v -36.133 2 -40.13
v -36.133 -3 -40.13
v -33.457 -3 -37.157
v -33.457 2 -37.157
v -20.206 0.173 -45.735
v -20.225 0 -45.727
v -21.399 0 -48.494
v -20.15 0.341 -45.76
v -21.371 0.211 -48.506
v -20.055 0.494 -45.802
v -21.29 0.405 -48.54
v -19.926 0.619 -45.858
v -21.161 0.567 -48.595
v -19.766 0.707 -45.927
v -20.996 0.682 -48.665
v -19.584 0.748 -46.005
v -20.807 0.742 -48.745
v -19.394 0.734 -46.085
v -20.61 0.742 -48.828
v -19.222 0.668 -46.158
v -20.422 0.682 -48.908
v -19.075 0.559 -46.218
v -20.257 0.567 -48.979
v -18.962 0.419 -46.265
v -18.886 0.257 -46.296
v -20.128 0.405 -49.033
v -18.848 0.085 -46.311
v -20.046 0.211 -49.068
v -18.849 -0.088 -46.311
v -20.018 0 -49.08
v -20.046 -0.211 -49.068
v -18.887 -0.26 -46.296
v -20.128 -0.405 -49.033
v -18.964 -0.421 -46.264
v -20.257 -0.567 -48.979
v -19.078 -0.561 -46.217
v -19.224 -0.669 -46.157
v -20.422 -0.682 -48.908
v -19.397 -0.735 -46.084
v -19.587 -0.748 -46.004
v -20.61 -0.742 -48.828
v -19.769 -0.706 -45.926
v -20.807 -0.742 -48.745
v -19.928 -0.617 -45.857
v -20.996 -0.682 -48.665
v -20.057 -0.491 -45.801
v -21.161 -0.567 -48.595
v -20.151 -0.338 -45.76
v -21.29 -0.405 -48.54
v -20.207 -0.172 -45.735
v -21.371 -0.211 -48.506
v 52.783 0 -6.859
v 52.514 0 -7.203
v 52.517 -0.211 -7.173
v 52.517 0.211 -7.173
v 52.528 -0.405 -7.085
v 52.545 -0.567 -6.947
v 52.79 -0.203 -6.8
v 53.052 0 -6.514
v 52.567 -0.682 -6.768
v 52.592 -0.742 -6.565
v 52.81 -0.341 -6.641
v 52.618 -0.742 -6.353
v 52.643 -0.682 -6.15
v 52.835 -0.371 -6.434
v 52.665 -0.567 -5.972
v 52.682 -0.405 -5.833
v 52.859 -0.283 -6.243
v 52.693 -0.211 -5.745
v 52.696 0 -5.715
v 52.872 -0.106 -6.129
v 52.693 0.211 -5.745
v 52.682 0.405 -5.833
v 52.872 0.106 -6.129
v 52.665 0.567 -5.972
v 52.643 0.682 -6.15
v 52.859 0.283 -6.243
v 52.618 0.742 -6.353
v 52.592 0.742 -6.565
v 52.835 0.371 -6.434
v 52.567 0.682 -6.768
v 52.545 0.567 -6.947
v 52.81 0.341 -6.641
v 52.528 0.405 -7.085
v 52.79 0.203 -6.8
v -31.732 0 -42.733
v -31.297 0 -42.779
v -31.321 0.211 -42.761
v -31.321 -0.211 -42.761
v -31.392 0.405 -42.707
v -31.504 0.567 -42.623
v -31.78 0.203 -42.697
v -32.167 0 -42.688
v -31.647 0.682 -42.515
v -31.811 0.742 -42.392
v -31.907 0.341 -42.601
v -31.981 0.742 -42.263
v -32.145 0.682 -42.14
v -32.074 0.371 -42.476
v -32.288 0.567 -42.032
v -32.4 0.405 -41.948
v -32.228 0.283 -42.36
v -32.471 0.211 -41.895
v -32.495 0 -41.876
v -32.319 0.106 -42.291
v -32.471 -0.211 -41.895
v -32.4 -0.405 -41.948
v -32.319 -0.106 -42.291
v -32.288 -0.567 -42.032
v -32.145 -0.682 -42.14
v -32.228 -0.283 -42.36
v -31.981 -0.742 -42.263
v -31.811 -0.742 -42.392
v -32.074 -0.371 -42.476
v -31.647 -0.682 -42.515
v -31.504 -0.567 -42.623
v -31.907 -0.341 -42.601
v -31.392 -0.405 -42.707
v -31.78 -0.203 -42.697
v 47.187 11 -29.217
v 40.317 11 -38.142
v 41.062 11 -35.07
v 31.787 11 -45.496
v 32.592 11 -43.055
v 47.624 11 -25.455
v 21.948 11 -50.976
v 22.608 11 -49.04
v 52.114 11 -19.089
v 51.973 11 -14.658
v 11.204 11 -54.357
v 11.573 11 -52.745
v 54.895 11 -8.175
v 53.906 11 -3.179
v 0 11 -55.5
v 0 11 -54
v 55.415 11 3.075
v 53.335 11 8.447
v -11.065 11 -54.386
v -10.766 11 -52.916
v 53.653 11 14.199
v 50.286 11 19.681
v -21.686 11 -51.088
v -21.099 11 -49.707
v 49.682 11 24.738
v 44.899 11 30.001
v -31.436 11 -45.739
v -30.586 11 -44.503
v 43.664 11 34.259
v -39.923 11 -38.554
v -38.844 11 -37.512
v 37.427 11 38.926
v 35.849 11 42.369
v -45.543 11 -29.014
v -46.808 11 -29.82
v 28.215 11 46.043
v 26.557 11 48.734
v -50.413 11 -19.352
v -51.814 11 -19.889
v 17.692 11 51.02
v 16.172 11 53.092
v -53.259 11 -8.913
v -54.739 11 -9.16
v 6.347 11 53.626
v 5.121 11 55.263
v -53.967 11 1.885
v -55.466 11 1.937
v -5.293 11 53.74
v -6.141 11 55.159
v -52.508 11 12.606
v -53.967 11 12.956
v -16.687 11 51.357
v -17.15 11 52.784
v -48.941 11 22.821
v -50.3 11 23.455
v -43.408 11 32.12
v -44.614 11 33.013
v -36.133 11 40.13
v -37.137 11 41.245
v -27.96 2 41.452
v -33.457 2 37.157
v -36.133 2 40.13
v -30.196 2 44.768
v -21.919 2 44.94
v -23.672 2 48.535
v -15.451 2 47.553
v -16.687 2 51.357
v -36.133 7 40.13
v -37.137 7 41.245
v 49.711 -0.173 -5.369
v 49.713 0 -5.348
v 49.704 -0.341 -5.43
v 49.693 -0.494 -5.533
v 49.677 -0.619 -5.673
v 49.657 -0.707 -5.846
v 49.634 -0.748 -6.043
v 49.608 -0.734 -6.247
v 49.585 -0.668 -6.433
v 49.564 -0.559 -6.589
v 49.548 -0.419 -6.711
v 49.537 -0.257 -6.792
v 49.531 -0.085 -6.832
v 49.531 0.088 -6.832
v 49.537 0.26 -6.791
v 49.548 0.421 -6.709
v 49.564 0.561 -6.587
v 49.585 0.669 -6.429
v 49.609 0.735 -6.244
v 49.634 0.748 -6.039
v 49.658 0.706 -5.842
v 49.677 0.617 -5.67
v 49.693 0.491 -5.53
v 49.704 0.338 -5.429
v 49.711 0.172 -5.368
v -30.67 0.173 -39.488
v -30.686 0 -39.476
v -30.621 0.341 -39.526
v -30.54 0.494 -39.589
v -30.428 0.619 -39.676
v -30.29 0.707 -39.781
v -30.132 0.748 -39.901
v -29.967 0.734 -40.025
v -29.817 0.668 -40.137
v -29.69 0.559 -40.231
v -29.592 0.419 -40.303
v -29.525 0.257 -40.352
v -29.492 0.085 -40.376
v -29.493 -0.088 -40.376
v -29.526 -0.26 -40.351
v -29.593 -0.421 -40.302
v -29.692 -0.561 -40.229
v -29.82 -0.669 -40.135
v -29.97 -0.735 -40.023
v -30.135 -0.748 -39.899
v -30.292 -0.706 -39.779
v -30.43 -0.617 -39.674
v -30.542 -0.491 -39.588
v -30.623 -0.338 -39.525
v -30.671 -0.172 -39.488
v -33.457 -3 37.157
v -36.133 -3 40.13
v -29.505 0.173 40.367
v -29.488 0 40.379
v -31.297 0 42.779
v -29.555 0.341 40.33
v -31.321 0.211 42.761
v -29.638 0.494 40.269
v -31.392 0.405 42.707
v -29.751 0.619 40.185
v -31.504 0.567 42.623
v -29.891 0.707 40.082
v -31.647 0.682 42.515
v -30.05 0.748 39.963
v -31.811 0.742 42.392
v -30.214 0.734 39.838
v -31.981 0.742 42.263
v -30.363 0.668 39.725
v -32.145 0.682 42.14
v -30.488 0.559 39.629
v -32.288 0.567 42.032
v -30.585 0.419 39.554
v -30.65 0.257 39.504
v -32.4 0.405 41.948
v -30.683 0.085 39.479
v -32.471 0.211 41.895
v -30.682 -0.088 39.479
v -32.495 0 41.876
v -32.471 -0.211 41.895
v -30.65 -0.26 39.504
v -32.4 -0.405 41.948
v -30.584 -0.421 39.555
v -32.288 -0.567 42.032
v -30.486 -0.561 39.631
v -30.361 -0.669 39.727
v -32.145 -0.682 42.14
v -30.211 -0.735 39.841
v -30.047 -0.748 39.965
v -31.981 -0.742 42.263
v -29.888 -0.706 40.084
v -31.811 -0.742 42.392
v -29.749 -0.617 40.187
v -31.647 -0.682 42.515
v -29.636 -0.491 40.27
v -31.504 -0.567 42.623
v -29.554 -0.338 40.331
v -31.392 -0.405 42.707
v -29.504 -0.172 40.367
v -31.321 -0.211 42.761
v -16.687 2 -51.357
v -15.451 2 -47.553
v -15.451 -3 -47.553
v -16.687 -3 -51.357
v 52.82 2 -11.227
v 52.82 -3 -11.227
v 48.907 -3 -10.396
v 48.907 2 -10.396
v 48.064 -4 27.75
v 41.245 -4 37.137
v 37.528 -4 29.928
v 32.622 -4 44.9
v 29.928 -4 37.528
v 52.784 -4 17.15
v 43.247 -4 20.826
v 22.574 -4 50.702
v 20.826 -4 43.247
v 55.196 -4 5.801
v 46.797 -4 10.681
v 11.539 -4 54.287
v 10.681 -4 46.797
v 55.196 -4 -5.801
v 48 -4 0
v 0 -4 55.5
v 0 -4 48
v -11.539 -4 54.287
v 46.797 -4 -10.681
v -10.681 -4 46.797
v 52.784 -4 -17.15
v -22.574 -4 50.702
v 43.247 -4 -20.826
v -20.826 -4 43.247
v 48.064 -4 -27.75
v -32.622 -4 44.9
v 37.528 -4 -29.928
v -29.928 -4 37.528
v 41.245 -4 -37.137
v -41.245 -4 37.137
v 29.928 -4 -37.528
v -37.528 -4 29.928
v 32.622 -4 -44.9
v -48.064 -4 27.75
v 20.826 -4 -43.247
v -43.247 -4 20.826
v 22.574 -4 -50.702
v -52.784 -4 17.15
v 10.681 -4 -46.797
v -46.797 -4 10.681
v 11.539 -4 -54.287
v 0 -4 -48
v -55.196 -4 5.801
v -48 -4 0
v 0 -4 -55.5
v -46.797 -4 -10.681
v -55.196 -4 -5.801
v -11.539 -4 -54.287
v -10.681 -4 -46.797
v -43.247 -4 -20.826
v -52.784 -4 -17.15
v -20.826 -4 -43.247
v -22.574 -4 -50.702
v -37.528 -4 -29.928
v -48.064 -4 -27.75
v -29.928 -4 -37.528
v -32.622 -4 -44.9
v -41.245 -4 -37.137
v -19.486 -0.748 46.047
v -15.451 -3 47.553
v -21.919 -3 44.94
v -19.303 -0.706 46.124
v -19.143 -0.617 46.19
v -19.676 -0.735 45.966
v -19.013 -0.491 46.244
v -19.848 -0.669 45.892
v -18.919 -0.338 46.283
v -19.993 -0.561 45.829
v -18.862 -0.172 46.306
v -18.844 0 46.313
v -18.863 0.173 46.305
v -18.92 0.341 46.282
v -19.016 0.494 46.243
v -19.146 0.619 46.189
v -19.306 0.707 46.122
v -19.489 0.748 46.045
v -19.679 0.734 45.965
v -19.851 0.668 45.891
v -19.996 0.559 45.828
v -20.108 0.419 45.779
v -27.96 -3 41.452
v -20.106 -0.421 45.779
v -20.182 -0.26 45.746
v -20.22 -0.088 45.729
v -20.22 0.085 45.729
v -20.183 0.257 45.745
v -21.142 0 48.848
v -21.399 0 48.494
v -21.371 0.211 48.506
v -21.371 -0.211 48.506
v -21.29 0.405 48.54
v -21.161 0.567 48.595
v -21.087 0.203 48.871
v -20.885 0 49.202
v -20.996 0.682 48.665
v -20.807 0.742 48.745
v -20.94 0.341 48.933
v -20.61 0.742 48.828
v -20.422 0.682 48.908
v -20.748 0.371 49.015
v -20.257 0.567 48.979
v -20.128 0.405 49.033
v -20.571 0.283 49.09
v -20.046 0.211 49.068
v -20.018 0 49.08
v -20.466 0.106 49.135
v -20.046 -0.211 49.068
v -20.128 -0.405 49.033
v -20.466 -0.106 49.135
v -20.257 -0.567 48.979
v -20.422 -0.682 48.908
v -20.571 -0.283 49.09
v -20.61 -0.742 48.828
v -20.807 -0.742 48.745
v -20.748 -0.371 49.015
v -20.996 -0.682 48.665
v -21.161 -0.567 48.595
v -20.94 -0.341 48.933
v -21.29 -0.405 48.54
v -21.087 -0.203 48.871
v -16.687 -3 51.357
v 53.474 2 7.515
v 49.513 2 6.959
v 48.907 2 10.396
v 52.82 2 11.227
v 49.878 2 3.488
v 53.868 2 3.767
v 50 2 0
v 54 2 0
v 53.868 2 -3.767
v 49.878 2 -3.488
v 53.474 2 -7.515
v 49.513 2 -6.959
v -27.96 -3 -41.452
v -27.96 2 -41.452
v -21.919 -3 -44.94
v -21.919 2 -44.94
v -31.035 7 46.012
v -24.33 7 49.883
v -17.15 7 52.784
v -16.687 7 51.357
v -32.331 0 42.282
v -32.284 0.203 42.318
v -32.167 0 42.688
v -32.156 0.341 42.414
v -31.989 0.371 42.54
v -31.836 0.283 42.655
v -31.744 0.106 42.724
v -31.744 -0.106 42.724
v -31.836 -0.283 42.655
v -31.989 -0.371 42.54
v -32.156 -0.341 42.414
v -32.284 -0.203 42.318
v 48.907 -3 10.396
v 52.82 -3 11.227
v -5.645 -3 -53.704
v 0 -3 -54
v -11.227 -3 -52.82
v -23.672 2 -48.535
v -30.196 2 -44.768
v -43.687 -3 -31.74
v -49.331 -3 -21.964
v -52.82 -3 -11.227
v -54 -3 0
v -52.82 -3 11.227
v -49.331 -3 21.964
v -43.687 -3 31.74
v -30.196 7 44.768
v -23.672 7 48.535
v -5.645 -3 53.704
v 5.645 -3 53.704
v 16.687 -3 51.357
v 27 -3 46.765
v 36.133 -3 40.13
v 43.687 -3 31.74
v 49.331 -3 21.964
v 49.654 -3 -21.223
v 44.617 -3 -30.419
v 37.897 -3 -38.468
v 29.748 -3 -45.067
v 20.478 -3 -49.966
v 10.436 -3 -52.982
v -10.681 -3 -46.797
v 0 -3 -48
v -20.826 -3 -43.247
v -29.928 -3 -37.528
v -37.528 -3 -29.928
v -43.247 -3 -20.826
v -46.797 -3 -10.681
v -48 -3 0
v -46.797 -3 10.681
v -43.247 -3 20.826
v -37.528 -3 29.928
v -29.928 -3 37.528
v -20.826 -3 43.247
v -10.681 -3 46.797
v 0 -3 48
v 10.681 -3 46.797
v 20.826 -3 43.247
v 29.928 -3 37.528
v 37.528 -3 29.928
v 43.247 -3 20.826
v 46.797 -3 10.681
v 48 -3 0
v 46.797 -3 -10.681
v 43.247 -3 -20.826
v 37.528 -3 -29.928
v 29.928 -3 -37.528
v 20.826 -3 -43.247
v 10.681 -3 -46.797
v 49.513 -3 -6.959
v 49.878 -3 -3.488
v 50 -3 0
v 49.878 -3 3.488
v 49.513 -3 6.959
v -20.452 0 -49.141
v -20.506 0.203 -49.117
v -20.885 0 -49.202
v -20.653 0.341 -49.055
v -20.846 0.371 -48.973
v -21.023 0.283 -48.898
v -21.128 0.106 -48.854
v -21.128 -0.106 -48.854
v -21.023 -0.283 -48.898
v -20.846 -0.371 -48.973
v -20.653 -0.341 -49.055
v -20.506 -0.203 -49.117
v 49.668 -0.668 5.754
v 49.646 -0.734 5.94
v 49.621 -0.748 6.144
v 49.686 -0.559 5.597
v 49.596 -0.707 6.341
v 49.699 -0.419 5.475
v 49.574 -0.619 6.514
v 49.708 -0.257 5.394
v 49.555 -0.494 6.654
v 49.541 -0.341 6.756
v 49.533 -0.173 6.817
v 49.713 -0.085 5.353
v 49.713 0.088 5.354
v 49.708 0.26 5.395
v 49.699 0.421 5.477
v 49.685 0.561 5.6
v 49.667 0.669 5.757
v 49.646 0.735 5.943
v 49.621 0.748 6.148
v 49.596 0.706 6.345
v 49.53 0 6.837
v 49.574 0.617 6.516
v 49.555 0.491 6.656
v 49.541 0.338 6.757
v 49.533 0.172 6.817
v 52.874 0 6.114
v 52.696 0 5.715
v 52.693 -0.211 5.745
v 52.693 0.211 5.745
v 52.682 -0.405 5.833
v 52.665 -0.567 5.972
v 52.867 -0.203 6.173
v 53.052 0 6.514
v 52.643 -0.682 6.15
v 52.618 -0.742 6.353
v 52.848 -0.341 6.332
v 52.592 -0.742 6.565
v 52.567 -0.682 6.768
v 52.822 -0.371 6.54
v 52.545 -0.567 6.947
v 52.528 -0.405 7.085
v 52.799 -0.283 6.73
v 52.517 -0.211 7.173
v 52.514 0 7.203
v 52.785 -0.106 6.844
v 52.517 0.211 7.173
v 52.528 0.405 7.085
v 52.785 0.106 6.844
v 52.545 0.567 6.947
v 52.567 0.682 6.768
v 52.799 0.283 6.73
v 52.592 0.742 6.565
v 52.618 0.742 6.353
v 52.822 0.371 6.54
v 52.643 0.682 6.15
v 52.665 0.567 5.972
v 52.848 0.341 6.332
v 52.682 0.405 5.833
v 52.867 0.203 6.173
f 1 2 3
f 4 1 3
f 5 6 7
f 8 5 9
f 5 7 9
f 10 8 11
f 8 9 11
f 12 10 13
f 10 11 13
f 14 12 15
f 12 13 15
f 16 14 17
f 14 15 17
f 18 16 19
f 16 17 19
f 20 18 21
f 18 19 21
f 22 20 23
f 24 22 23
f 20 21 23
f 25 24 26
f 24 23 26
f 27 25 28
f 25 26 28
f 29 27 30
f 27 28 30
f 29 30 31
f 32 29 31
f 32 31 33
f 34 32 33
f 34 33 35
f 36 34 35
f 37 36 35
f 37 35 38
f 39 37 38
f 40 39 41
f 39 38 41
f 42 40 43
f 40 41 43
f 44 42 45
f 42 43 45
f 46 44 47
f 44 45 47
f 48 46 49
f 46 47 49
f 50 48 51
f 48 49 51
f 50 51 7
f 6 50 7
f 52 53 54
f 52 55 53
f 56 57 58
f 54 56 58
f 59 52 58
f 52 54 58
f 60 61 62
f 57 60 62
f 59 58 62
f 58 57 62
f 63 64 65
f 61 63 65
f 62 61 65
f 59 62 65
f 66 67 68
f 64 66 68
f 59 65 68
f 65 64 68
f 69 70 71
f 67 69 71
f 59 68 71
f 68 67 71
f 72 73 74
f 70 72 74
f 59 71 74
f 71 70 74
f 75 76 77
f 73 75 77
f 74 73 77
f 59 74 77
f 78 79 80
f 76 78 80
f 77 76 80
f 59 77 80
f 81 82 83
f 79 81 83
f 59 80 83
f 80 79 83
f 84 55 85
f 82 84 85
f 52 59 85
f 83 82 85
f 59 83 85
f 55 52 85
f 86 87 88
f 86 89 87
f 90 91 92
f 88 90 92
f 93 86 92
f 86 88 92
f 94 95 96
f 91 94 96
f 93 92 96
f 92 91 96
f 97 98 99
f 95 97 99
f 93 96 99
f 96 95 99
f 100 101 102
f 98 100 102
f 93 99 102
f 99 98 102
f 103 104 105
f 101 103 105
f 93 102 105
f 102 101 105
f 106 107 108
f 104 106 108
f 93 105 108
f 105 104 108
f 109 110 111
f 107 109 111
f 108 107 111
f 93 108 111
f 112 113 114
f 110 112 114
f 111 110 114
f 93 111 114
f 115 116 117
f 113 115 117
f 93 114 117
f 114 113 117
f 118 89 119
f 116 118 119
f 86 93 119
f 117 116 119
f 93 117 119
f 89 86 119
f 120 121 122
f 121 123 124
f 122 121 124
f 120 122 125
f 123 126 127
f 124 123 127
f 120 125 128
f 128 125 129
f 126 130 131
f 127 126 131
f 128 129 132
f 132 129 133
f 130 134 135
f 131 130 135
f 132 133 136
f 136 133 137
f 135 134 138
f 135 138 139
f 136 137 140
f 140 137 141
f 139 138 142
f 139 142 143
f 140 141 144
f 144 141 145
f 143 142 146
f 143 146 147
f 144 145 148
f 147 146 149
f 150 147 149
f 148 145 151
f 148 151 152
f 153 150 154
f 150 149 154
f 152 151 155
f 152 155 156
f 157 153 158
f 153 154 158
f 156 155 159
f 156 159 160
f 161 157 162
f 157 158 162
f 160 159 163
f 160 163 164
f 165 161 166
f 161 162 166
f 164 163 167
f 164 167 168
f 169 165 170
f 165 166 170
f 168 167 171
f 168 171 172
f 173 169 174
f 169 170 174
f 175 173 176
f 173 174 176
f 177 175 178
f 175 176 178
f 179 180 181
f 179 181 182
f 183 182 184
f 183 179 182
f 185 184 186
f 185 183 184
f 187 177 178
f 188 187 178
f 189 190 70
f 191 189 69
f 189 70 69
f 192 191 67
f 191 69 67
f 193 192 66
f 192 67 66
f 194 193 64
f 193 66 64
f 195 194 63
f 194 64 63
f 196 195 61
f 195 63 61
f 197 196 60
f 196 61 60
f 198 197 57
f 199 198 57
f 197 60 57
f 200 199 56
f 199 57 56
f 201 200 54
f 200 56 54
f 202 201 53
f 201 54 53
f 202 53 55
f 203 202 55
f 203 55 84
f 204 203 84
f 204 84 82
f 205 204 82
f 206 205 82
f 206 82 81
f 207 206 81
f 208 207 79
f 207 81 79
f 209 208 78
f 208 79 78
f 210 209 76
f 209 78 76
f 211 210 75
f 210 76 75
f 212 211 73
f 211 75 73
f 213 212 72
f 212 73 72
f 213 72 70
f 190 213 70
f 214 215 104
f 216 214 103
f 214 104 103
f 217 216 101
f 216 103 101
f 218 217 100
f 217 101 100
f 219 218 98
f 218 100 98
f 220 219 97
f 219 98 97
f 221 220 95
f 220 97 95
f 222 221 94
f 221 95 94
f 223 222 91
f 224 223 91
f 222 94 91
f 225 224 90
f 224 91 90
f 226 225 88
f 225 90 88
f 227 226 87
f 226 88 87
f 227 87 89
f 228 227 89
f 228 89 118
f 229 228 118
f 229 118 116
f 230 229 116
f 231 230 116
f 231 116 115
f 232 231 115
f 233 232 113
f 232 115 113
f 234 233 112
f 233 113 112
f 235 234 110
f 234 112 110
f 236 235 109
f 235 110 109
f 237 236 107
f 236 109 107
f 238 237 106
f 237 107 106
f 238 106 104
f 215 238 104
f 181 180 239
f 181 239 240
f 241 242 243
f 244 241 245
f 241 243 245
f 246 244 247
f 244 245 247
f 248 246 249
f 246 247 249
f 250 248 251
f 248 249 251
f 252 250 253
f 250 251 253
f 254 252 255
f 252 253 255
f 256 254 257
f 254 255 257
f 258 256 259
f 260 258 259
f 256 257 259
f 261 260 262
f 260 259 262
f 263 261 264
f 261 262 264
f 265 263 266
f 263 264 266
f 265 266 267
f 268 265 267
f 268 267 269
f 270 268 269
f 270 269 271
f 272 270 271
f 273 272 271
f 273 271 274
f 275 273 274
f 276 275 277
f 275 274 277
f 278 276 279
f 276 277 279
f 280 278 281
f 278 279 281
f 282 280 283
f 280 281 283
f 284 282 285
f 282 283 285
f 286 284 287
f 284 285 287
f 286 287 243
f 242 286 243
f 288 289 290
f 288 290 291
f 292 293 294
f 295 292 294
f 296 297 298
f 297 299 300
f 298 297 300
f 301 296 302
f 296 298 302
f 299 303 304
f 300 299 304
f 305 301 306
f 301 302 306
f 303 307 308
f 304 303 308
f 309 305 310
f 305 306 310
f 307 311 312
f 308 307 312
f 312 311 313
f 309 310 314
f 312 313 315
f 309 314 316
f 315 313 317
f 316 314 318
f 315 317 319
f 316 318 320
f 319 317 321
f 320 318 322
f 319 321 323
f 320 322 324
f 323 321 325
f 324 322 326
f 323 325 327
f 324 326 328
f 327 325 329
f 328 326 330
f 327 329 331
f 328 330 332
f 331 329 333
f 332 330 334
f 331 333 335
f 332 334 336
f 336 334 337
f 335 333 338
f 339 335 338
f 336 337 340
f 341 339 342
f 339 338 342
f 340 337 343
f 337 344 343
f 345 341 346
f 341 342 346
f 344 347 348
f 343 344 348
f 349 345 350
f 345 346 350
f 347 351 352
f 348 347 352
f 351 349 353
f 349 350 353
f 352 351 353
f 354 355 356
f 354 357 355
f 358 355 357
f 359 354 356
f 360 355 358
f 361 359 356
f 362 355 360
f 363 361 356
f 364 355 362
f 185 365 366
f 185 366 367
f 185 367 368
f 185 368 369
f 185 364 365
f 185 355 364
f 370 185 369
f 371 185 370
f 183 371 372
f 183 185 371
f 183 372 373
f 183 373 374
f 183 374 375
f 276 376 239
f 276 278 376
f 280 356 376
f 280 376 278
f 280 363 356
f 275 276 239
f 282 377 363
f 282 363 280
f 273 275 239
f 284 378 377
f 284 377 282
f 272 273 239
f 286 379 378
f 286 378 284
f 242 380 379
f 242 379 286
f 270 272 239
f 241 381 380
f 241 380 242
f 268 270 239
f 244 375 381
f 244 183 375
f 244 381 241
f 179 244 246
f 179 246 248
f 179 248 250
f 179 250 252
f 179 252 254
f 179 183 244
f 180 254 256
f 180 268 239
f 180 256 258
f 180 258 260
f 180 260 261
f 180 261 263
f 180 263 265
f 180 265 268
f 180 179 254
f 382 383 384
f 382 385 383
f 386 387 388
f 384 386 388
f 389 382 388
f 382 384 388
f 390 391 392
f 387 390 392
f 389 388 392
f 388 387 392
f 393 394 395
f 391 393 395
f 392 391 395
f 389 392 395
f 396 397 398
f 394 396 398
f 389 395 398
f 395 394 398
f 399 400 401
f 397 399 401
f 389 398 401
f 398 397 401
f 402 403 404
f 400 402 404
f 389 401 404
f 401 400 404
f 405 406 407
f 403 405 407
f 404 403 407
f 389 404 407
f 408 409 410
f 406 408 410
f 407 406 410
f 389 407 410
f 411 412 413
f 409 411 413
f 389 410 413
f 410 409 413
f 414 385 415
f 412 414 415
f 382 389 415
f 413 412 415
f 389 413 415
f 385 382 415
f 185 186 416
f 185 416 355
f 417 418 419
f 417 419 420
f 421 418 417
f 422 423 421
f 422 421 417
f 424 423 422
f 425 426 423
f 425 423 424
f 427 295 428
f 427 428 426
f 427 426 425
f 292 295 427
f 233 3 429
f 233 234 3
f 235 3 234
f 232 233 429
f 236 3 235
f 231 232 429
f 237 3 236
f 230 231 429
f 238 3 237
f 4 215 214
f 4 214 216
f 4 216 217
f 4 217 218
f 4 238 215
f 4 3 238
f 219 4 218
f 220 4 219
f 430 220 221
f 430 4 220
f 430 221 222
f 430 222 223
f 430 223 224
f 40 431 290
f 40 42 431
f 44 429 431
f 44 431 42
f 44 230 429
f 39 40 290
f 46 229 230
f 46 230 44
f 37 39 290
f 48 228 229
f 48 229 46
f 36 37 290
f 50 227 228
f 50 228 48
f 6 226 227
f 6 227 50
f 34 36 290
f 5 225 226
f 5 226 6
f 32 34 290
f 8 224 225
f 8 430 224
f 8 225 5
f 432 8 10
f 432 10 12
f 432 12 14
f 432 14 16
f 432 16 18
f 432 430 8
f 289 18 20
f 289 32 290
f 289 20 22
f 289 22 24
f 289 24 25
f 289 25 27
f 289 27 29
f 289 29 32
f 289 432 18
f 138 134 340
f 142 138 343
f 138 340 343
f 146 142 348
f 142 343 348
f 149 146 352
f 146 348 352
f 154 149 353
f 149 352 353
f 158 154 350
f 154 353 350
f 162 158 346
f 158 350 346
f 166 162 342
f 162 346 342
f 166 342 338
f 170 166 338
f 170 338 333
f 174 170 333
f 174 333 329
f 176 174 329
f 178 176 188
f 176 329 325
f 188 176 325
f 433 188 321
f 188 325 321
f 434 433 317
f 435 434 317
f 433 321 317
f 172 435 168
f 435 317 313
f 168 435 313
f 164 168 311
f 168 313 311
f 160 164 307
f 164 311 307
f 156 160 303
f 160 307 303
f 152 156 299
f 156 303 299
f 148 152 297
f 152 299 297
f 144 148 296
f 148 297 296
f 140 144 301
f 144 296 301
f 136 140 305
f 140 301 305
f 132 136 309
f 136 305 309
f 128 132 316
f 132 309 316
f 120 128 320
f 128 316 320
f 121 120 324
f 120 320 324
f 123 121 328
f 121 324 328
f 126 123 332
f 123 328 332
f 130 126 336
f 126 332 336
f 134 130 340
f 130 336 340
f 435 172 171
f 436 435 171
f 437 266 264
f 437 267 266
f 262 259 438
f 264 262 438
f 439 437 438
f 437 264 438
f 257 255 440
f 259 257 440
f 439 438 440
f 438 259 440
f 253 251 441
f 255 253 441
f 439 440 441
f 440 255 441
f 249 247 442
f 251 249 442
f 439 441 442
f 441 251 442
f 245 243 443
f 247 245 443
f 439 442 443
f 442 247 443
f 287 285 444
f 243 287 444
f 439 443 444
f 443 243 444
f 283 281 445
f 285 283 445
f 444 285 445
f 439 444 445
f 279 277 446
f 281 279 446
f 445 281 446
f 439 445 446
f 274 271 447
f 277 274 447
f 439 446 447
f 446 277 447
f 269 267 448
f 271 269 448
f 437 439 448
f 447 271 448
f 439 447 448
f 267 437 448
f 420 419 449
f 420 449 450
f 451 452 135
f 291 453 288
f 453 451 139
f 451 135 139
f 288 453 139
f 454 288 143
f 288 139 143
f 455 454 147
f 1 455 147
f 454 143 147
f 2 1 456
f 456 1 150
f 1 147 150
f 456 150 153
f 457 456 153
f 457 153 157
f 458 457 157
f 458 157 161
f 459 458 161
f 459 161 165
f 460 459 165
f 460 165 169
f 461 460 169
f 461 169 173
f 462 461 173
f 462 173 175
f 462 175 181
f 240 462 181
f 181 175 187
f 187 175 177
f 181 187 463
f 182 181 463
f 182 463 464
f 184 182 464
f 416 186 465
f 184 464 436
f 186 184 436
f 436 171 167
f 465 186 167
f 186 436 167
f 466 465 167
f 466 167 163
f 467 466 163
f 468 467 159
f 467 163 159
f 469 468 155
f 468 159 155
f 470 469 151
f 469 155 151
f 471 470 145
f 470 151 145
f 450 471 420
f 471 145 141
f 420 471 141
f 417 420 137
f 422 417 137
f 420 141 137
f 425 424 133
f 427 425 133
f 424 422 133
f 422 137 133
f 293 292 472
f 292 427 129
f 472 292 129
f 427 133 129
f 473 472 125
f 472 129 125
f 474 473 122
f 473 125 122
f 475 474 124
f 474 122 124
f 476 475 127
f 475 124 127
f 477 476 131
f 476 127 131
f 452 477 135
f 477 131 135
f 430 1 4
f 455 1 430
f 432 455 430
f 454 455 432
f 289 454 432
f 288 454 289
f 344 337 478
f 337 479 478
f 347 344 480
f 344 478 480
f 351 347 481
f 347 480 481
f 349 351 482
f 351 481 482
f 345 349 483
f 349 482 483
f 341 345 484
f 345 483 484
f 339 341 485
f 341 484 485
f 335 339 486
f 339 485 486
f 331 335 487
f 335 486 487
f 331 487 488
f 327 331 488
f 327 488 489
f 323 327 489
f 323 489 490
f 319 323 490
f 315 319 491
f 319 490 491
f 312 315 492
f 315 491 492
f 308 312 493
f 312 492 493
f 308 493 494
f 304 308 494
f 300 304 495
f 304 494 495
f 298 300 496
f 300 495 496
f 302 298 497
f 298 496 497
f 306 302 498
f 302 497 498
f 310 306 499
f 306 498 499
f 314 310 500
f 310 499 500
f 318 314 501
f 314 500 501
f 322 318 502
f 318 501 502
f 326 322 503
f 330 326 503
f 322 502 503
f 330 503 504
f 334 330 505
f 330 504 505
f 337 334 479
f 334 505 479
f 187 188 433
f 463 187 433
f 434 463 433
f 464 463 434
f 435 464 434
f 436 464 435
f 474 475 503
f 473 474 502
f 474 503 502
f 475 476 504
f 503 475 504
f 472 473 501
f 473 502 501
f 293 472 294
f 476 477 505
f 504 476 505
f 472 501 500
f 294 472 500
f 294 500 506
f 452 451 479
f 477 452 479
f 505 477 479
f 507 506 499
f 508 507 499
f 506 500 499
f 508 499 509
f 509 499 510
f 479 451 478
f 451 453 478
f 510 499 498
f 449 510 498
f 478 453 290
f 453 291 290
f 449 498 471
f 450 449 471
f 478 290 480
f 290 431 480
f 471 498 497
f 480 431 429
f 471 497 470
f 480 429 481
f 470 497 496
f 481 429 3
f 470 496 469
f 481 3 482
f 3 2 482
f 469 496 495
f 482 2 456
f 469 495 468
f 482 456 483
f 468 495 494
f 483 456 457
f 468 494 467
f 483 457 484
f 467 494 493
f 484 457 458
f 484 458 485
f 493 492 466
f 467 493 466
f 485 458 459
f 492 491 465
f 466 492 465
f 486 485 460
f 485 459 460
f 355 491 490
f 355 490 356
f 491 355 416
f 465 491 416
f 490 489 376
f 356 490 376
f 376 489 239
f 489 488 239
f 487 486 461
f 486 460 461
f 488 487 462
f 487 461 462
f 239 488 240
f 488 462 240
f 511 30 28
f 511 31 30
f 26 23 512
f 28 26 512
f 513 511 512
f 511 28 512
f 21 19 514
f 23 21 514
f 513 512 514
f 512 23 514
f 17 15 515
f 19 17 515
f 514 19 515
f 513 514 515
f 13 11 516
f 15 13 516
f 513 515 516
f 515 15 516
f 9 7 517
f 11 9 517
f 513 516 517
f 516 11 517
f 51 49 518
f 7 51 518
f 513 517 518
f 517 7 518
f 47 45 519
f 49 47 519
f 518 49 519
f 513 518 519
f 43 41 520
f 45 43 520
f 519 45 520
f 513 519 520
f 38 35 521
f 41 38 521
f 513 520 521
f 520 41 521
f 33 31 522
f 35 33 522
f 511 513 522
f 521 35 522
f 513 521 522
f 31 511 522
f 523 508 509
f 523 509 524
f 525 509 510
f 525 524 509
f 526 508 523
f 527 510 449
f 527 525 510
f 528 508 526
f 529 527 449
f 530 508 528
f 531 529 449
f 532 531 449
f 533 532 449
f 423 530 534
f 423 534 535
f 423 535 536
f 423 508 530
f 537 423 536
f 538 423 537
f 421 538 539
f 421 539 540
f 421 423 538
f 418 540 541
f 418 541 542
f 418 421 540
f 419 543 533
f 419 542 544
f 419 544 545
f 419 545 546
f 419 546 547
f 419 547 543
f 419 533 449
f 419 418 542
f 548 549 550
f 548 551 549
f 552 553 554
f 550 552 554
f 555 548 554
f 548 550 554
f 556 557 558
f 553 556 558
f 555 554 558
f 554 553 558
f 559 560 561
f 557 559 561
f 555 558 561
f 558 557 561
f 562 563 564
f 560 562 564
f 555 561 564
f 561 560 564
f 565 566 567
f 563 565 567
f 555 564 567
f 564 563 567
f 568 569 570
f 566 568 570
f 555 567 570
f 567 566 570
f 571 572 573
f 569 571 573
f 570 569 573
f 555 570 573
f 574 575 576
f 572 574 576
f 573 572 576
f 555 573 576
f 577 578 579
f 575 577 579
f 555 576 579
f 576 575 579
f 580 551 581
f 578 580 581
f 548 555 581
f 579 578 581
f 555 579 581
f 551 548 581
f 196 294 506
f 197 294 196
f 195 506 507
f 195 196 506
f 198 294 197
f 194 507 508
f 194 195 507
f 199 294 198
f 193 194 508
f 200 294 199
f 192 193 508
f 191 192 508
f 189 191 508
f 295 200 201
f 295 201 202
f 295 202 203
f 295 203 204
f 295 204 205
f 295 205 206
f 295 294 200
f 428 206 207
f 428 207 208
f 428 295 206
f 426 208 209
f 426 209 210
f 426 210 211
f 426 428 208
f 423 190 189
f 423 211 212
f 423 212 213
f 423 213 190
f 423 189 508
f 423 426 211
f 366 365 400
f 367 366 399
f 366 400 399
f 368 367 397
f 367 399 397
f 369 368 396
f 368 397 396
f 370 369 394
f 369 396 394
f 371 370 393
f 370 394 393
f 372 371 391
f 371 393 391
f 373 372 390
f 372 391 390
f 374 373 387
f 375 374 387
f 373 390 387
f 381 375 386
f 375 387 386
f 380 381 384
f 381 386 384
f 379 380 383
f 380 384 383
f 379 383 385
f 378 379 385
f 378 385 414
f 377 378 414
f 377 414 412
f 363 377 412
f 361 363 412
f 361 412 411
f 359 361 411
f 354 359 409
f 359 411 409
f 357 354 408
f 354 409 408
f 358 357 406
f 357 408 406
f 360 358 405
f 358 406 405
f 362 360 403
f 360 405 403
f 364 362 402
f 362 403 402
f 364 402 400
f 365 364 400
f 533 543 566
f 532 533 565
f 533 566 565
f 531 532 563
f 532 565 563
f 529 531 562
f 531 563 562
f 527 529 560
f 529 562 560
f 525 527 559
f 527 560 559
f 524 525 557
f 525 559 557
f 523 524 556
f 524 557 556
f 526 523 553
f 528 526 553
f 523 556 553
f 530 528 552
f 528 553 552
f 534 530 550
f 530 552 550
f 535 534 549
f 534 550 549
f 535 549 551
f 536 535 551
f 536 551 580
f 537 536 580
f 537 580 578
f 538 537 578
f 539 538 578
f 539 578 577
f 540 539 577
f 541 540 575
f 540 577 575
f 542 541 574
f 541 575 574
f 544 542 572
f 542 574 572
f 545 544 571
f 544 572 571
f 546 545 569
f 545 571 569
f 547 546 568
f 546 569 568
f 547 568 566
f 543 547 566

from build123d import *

# Parameters (mm, degrees)
BOSS_EXTRUDE1_DEPTH                 = 5
BOSS_EXTRUDE2_DEPTH                 = 5
BOSS_EXTRUDE3_DEPTH                 = 5
F_1_5MM_DOWEL_HOLE1_D               = 1.5
F_1_5MM_DOWEL_HOLE1_DEPTH           = 3
F_1_5MM_DOWEL_HOLE1_TIP             = 0.450645464
F_1_5MM_DOWEL_HOLE1_ON_FACE_2_D     = 1.5
F_1_5MM_DOWEL_HOLE1_ON_FACE_2_DEPTH = 3
F_1_5MM_DOWEL_HOLE1_ON_FACE_2_TIP   = 0.450645464
F_1_5MM_DOWEL_HOLE1_ON_FACE_3_D     = 1.5
F_1_5MM_DOWEL_HOLE1_ON_FACE_3_DEPTH = 3
F_1_5MM_DOWEL_HOLE1_ON_FACE_3_TIP   = 0.450645464
F_1_5MM_DOWEL_HOLE1_ON_FACE_4_D     = 1.5
F_1_5MM_DOWEL_HOLE1_ON_FACE_4_DEPTH = 3
F_1_5MM_DOWEL_HOLE1_ON_FACE_4_TIP   = 0.450645464
F_1_5MM_DOWEL_HOLE1_ON_FACE_5_D     = 1.5
F_1_5MM_DOWEL_HOLE1_ON_FACE_5_DEPTH = 3
F_1_5MM_DOWEL_HOLE1_ON_FACE_5_TIP   = 0.450645464
F_1_5MM_DOWEL_HOLE1_ON_FACE_6_D     = 1.5
F_1_5MM_DOWEL_HOLE1_ON_FACE_6_DEPTH = 3
F_1_5MM_DOWEL_HOLE1_ON_FACE_6_TIP   = 0.450645464
CUT_EXTRUDE2_DEPTH                  = 4


with BuildPart() as part:
    # Sketch1 → Revolve1 (revolve)
    with BuildSketch(Plane.XY):
        Polygon((55.5, -4), (55.5, 11), (54, 11), (54, -3), (48, -3), (48, -4), align=None)
    revolve(axis=Axis((0, 0, 0), (0, 1, 0)))

    # Sketch3 → Boss-Extrude1 (add)
    with BuildSketch(Plane(origin=(0, -3, 0), x_dir=(1, 0, 0), z_dir=(0, 1, 0))):
        with BuildLine():
            Line((-16.686917696, -51.35705188), (-15.450849719, -47.552825815))
            ThreePointArc((-15.450849719, -47.552825815), (-25, -43.301270189), (-33.456530318, -37.157241274))
            Line((-33.456530318, -37.157241274), (-36.133052743, -40.129820576))
            ThreePointArc((-36.133052743, -40.129820576), (-27, -46.765371804), (-16.686917696, -51.35705188))
        make_face()
    extrude(amount=BOSS_EXTRUDE1_DEPTH)

    # Sketch3<3> → Boss-Extrude2 (add)
    with BuildSketch(Plane(origin=(0, -3, 0), x_dir=(1, 0, 0), z_dir=(0, 1, 0))):
        with BuildLine():
            ThreePointArc((48.907380037, 10.395584541), (49.726094768, 5.226423163), (50, 0))
            ThreePointArc((50, 0), (49.726094768, -5.226423163), (48.907380037, -10.395584541))
            Line((48.907380037, -10.395584541), (52.81997044, -11.227231304))
            ThreePointArc((52.81997044, -11.227231304), (53.70418235, -5.644537016), (54, 0))
            ThreePointArc((54, 0), (53.70418235, 5.644537016), (52.81997044, 11.227231304))
            Line((52.81997044, 11.227231304), (48.907380037, 10.395584541))
        make_face()
    extrude(amount=BOSS_EXTRUDE2_DEPTH)

    # Sketch3<4> → Boss-Extrude3 (add)
    with BuildSketch(Plane(origin=(0, -3, 0), x_dir=(1, 0, 0), z_dir=(0, 1, 0))):
        with BuildLine():
            Line((-36.133052743, 40.129820576), (-33.456530318, 37.157241274))
            ThreePointArc((-33.456530318, 37.157241274), (-25, 43.301270189), (-15.450849719, 47.552825815))
            Line((-15.450849719, 47.552825815), (-16.686917696, 51.35705188))
            ThreePointArc((-16.686917696, 51.35705188), (-27, 46.765371804), (-36.133052743, 40.129820576))
        make_face()
    extrude(amount=BOSS_EXTRUDE3_DEPTH)

    # Ø1.5mm Dowel Hole1
    with Locations(Plane(origin=(-30.090751158, 0, -39.931775502), x_dir=(0.798635510047, 0, -0.601815023152), z_dir=(0.601815023152, 0, 0.798635510047))):
        with Locations((1e-09, 0)):
            Hole(F_1_5MM_DOWEL_HOLE1_D / 2, depth=F_1_5MM_DOWEL_HOLE1_DEPTH)
            with Locations((0, 0, -(F_1_5MM_DOWEL_HOLE1_DEPTH + F_1_5MM_DOWEL_HOLE1_TIP / 2))):  # 118° drill point
                Cone(0, F_1_5MM_DOWEL_HOLE1_D / 2, F_1_5MM_DOWEL_HOLE1_TIP, mode=Mode.SUBTRACT)

    # Ø1.5mm Dowel Hole1 on face 2
    with Locations(Plane(origin=(-19.536556424, 0, -46.025242673), x_dir=(0.92050492204, 0, -0.390730966908), z_dir=(0.390730966908, 0, 0.92050492204))):
        with Locations((-1e-09, 0)):
            Hole(F_1_5MM_DOWEL_HOLE1_ON_FACE_2_D / 2, depth=F_1_5MM_DOWEL_HOLE1_ON_FACE_2_DEPTH)
            with Locations((0, 0, -(F_1_5MM_DOWEL_HOLE1_ON_FACE_2_DEPTH + F_1_5MM_DOWEL_HOLE1_ON_FACE_2_TIP / 2))):  # 118° drill point
                Cone(0, F_1_5MM_DOWEL_HOLE1_ON_FACE_2_D / 2, F_1_5MM_DOWEL_HOLE1_ON_FACE_2_TIP, mode=Mode.SUBTRACT)

    # Ø1.5mm Dowel Hole1 on face 3
    with Locations(Plane(origin=(49.627307582, 0, -6.09346717), x_dir=(-0.121869023443, 0, -0.992546190928), z_dir=(-0.992546190928, 0, 0.121869023443))):
        with Locations((0, 0)):
            Hole(F_1_5MM_DOWEL_HOLE1_ON_FACE_3_D / 2, depth=F_1_5MM_DOWEL_HOLE1_ON_FACE_3_DEPTH)
            with Locations((0, 0, -(F_1_5MM_DOWEL_HOLE1_ON_FACE_3_DEPTH + F_1_5MM_DOWEL_HOLE1_ON_FACE_3_TIP / 2))):  # 118° drill point
                Cone(0, F_1_5MM_DOWEL_HOLE1_ON_FACE_3_D / 2, F_1_5MM_DOWEL_HOLE1_ON_FACE_3_TIP, mode=Mode.SUBTRACT)

    # Ø1.5mm Dowel Hole1 on face 4
    with Locations(Plane(origin=(49.627307582, 0, 6.09346717), x_dir=(0.121869023443, 0, -0.992546190928), z_dir=(-0.992546190928, 0, -0.121869023443))):
        with Locations((0, 0)):
            Hole(F_1_5MM_DOWEL_HOLE1_ON_FACE_4_D / 2, depth=F_1_5MM_DOWEL_HOLE1_ON_FACE_4_DEPTH)
            with Locations((0, 0, -(F_1_5MM_DOWEL_HOLE1_ON_FACE_4_DEPTH + F_1_5MM_DOWEL_HOLE1_ON_FACE_4_TIP / 2))):  # 118° drill point
                Cone(0, F_1_5MM_DOWEL_HOLE1_ON_FACE_4_D / 2, F_1_5MM_DOWEL_HOLE1_ON_FACE_4_TIP, mode=Mode.SUBTRACT)

    # Ø1.5mm Dowel Hole1 on face 5
    with Locations(Plane(origin=(-30.090751158, 0, 39.931775502), x_dir=(-0.798635698626, 0, -0.601814772899), z_dir=(0.601814772899, 0, -0.798635698626))):
        with Locations((-1e-09, 0)):
            Hole(F_1_5MM_DOWEL_HOLE1_ON_FACE_5_D / 2, depth=F_1_5MM_DOWEL_HOLE1_ON_FACE_5_DEPTH)
            with Locations((0, 0, -(F_1_5MM_DOWEL_HOLE1_ON_FACE_5_DEPTH + F_1_5MM_DOWEL_HOLE1_ON_FACE_5_TIP / 2))):  # 118° drill point
                Cone(0, F_1_5MM_DOWEL_HOLE1_ON_FACE_5_D / 2, F_1_5MM_DOWEL_HOLE1_ON_FACE_5_TIP, mode=Mode.SUBTRACT)

    # Ø1.5mm Dowel Hole1 on face 6
    with Locations(Plane(origin=(-19.536556424, 0, 46.025242673), x_dir=(-0.92050492204, 0, -0.390730966908), z_dir=(0.390730966908, 0, -0.92050492204))):
        with Locations((1e-09, 0)):
            Hole(F_1_5MM_DOWEL_HOLE1_ON_FACE_6_D / 2, depth=F_1_5MM_DOWEL_HOLE1_ON_FACE_6_DEPTH)
            with Locations((0, 0, -(F_1_5MM_DOWEL_HOLE1_ON_FACE_6_DEPTH + F_1_5MM_DOWEL_HOLE1_ON_FACE_6_TIP / 2))):  # 118° drill point
                Cone(0, F_1_5MM_DOWEL_HOLE1_ON_FACE_6_D / 2, F_1_5MM_DOWEL_HOLE1_ON_FACE_6_TIP, mode=Mode.SUBTRACT)

    # Sketch7 → Cut-Extrude2 (cut)
    with BuildSketch(Plane(origin=(0, 11, 0), x_dir=(1, 0, 0), z_dir=(0, 1, 0))):
        with BuildLine():
            Line((-17.150443188, -52.783636654), (-16.686917696, -51.35705188))
            ThreePointArc((-16.686917696, -51.35705188), (-27, -46.765371804), (-36.133052743, -40.129820576))
            Line((-36.133052743, -40.129820576), (-37.136748653, -41.244537814))
            ThreePointArc((-37.136748653, -41.244537814), (-27.75, -48.06440991), (-17.150443188, -52.783636654))
        make_face()
    extrude(amount=-CUT_EXTRUDE2_DEPTH, mode=Mode.SUBTRACT)


solid = part.part
